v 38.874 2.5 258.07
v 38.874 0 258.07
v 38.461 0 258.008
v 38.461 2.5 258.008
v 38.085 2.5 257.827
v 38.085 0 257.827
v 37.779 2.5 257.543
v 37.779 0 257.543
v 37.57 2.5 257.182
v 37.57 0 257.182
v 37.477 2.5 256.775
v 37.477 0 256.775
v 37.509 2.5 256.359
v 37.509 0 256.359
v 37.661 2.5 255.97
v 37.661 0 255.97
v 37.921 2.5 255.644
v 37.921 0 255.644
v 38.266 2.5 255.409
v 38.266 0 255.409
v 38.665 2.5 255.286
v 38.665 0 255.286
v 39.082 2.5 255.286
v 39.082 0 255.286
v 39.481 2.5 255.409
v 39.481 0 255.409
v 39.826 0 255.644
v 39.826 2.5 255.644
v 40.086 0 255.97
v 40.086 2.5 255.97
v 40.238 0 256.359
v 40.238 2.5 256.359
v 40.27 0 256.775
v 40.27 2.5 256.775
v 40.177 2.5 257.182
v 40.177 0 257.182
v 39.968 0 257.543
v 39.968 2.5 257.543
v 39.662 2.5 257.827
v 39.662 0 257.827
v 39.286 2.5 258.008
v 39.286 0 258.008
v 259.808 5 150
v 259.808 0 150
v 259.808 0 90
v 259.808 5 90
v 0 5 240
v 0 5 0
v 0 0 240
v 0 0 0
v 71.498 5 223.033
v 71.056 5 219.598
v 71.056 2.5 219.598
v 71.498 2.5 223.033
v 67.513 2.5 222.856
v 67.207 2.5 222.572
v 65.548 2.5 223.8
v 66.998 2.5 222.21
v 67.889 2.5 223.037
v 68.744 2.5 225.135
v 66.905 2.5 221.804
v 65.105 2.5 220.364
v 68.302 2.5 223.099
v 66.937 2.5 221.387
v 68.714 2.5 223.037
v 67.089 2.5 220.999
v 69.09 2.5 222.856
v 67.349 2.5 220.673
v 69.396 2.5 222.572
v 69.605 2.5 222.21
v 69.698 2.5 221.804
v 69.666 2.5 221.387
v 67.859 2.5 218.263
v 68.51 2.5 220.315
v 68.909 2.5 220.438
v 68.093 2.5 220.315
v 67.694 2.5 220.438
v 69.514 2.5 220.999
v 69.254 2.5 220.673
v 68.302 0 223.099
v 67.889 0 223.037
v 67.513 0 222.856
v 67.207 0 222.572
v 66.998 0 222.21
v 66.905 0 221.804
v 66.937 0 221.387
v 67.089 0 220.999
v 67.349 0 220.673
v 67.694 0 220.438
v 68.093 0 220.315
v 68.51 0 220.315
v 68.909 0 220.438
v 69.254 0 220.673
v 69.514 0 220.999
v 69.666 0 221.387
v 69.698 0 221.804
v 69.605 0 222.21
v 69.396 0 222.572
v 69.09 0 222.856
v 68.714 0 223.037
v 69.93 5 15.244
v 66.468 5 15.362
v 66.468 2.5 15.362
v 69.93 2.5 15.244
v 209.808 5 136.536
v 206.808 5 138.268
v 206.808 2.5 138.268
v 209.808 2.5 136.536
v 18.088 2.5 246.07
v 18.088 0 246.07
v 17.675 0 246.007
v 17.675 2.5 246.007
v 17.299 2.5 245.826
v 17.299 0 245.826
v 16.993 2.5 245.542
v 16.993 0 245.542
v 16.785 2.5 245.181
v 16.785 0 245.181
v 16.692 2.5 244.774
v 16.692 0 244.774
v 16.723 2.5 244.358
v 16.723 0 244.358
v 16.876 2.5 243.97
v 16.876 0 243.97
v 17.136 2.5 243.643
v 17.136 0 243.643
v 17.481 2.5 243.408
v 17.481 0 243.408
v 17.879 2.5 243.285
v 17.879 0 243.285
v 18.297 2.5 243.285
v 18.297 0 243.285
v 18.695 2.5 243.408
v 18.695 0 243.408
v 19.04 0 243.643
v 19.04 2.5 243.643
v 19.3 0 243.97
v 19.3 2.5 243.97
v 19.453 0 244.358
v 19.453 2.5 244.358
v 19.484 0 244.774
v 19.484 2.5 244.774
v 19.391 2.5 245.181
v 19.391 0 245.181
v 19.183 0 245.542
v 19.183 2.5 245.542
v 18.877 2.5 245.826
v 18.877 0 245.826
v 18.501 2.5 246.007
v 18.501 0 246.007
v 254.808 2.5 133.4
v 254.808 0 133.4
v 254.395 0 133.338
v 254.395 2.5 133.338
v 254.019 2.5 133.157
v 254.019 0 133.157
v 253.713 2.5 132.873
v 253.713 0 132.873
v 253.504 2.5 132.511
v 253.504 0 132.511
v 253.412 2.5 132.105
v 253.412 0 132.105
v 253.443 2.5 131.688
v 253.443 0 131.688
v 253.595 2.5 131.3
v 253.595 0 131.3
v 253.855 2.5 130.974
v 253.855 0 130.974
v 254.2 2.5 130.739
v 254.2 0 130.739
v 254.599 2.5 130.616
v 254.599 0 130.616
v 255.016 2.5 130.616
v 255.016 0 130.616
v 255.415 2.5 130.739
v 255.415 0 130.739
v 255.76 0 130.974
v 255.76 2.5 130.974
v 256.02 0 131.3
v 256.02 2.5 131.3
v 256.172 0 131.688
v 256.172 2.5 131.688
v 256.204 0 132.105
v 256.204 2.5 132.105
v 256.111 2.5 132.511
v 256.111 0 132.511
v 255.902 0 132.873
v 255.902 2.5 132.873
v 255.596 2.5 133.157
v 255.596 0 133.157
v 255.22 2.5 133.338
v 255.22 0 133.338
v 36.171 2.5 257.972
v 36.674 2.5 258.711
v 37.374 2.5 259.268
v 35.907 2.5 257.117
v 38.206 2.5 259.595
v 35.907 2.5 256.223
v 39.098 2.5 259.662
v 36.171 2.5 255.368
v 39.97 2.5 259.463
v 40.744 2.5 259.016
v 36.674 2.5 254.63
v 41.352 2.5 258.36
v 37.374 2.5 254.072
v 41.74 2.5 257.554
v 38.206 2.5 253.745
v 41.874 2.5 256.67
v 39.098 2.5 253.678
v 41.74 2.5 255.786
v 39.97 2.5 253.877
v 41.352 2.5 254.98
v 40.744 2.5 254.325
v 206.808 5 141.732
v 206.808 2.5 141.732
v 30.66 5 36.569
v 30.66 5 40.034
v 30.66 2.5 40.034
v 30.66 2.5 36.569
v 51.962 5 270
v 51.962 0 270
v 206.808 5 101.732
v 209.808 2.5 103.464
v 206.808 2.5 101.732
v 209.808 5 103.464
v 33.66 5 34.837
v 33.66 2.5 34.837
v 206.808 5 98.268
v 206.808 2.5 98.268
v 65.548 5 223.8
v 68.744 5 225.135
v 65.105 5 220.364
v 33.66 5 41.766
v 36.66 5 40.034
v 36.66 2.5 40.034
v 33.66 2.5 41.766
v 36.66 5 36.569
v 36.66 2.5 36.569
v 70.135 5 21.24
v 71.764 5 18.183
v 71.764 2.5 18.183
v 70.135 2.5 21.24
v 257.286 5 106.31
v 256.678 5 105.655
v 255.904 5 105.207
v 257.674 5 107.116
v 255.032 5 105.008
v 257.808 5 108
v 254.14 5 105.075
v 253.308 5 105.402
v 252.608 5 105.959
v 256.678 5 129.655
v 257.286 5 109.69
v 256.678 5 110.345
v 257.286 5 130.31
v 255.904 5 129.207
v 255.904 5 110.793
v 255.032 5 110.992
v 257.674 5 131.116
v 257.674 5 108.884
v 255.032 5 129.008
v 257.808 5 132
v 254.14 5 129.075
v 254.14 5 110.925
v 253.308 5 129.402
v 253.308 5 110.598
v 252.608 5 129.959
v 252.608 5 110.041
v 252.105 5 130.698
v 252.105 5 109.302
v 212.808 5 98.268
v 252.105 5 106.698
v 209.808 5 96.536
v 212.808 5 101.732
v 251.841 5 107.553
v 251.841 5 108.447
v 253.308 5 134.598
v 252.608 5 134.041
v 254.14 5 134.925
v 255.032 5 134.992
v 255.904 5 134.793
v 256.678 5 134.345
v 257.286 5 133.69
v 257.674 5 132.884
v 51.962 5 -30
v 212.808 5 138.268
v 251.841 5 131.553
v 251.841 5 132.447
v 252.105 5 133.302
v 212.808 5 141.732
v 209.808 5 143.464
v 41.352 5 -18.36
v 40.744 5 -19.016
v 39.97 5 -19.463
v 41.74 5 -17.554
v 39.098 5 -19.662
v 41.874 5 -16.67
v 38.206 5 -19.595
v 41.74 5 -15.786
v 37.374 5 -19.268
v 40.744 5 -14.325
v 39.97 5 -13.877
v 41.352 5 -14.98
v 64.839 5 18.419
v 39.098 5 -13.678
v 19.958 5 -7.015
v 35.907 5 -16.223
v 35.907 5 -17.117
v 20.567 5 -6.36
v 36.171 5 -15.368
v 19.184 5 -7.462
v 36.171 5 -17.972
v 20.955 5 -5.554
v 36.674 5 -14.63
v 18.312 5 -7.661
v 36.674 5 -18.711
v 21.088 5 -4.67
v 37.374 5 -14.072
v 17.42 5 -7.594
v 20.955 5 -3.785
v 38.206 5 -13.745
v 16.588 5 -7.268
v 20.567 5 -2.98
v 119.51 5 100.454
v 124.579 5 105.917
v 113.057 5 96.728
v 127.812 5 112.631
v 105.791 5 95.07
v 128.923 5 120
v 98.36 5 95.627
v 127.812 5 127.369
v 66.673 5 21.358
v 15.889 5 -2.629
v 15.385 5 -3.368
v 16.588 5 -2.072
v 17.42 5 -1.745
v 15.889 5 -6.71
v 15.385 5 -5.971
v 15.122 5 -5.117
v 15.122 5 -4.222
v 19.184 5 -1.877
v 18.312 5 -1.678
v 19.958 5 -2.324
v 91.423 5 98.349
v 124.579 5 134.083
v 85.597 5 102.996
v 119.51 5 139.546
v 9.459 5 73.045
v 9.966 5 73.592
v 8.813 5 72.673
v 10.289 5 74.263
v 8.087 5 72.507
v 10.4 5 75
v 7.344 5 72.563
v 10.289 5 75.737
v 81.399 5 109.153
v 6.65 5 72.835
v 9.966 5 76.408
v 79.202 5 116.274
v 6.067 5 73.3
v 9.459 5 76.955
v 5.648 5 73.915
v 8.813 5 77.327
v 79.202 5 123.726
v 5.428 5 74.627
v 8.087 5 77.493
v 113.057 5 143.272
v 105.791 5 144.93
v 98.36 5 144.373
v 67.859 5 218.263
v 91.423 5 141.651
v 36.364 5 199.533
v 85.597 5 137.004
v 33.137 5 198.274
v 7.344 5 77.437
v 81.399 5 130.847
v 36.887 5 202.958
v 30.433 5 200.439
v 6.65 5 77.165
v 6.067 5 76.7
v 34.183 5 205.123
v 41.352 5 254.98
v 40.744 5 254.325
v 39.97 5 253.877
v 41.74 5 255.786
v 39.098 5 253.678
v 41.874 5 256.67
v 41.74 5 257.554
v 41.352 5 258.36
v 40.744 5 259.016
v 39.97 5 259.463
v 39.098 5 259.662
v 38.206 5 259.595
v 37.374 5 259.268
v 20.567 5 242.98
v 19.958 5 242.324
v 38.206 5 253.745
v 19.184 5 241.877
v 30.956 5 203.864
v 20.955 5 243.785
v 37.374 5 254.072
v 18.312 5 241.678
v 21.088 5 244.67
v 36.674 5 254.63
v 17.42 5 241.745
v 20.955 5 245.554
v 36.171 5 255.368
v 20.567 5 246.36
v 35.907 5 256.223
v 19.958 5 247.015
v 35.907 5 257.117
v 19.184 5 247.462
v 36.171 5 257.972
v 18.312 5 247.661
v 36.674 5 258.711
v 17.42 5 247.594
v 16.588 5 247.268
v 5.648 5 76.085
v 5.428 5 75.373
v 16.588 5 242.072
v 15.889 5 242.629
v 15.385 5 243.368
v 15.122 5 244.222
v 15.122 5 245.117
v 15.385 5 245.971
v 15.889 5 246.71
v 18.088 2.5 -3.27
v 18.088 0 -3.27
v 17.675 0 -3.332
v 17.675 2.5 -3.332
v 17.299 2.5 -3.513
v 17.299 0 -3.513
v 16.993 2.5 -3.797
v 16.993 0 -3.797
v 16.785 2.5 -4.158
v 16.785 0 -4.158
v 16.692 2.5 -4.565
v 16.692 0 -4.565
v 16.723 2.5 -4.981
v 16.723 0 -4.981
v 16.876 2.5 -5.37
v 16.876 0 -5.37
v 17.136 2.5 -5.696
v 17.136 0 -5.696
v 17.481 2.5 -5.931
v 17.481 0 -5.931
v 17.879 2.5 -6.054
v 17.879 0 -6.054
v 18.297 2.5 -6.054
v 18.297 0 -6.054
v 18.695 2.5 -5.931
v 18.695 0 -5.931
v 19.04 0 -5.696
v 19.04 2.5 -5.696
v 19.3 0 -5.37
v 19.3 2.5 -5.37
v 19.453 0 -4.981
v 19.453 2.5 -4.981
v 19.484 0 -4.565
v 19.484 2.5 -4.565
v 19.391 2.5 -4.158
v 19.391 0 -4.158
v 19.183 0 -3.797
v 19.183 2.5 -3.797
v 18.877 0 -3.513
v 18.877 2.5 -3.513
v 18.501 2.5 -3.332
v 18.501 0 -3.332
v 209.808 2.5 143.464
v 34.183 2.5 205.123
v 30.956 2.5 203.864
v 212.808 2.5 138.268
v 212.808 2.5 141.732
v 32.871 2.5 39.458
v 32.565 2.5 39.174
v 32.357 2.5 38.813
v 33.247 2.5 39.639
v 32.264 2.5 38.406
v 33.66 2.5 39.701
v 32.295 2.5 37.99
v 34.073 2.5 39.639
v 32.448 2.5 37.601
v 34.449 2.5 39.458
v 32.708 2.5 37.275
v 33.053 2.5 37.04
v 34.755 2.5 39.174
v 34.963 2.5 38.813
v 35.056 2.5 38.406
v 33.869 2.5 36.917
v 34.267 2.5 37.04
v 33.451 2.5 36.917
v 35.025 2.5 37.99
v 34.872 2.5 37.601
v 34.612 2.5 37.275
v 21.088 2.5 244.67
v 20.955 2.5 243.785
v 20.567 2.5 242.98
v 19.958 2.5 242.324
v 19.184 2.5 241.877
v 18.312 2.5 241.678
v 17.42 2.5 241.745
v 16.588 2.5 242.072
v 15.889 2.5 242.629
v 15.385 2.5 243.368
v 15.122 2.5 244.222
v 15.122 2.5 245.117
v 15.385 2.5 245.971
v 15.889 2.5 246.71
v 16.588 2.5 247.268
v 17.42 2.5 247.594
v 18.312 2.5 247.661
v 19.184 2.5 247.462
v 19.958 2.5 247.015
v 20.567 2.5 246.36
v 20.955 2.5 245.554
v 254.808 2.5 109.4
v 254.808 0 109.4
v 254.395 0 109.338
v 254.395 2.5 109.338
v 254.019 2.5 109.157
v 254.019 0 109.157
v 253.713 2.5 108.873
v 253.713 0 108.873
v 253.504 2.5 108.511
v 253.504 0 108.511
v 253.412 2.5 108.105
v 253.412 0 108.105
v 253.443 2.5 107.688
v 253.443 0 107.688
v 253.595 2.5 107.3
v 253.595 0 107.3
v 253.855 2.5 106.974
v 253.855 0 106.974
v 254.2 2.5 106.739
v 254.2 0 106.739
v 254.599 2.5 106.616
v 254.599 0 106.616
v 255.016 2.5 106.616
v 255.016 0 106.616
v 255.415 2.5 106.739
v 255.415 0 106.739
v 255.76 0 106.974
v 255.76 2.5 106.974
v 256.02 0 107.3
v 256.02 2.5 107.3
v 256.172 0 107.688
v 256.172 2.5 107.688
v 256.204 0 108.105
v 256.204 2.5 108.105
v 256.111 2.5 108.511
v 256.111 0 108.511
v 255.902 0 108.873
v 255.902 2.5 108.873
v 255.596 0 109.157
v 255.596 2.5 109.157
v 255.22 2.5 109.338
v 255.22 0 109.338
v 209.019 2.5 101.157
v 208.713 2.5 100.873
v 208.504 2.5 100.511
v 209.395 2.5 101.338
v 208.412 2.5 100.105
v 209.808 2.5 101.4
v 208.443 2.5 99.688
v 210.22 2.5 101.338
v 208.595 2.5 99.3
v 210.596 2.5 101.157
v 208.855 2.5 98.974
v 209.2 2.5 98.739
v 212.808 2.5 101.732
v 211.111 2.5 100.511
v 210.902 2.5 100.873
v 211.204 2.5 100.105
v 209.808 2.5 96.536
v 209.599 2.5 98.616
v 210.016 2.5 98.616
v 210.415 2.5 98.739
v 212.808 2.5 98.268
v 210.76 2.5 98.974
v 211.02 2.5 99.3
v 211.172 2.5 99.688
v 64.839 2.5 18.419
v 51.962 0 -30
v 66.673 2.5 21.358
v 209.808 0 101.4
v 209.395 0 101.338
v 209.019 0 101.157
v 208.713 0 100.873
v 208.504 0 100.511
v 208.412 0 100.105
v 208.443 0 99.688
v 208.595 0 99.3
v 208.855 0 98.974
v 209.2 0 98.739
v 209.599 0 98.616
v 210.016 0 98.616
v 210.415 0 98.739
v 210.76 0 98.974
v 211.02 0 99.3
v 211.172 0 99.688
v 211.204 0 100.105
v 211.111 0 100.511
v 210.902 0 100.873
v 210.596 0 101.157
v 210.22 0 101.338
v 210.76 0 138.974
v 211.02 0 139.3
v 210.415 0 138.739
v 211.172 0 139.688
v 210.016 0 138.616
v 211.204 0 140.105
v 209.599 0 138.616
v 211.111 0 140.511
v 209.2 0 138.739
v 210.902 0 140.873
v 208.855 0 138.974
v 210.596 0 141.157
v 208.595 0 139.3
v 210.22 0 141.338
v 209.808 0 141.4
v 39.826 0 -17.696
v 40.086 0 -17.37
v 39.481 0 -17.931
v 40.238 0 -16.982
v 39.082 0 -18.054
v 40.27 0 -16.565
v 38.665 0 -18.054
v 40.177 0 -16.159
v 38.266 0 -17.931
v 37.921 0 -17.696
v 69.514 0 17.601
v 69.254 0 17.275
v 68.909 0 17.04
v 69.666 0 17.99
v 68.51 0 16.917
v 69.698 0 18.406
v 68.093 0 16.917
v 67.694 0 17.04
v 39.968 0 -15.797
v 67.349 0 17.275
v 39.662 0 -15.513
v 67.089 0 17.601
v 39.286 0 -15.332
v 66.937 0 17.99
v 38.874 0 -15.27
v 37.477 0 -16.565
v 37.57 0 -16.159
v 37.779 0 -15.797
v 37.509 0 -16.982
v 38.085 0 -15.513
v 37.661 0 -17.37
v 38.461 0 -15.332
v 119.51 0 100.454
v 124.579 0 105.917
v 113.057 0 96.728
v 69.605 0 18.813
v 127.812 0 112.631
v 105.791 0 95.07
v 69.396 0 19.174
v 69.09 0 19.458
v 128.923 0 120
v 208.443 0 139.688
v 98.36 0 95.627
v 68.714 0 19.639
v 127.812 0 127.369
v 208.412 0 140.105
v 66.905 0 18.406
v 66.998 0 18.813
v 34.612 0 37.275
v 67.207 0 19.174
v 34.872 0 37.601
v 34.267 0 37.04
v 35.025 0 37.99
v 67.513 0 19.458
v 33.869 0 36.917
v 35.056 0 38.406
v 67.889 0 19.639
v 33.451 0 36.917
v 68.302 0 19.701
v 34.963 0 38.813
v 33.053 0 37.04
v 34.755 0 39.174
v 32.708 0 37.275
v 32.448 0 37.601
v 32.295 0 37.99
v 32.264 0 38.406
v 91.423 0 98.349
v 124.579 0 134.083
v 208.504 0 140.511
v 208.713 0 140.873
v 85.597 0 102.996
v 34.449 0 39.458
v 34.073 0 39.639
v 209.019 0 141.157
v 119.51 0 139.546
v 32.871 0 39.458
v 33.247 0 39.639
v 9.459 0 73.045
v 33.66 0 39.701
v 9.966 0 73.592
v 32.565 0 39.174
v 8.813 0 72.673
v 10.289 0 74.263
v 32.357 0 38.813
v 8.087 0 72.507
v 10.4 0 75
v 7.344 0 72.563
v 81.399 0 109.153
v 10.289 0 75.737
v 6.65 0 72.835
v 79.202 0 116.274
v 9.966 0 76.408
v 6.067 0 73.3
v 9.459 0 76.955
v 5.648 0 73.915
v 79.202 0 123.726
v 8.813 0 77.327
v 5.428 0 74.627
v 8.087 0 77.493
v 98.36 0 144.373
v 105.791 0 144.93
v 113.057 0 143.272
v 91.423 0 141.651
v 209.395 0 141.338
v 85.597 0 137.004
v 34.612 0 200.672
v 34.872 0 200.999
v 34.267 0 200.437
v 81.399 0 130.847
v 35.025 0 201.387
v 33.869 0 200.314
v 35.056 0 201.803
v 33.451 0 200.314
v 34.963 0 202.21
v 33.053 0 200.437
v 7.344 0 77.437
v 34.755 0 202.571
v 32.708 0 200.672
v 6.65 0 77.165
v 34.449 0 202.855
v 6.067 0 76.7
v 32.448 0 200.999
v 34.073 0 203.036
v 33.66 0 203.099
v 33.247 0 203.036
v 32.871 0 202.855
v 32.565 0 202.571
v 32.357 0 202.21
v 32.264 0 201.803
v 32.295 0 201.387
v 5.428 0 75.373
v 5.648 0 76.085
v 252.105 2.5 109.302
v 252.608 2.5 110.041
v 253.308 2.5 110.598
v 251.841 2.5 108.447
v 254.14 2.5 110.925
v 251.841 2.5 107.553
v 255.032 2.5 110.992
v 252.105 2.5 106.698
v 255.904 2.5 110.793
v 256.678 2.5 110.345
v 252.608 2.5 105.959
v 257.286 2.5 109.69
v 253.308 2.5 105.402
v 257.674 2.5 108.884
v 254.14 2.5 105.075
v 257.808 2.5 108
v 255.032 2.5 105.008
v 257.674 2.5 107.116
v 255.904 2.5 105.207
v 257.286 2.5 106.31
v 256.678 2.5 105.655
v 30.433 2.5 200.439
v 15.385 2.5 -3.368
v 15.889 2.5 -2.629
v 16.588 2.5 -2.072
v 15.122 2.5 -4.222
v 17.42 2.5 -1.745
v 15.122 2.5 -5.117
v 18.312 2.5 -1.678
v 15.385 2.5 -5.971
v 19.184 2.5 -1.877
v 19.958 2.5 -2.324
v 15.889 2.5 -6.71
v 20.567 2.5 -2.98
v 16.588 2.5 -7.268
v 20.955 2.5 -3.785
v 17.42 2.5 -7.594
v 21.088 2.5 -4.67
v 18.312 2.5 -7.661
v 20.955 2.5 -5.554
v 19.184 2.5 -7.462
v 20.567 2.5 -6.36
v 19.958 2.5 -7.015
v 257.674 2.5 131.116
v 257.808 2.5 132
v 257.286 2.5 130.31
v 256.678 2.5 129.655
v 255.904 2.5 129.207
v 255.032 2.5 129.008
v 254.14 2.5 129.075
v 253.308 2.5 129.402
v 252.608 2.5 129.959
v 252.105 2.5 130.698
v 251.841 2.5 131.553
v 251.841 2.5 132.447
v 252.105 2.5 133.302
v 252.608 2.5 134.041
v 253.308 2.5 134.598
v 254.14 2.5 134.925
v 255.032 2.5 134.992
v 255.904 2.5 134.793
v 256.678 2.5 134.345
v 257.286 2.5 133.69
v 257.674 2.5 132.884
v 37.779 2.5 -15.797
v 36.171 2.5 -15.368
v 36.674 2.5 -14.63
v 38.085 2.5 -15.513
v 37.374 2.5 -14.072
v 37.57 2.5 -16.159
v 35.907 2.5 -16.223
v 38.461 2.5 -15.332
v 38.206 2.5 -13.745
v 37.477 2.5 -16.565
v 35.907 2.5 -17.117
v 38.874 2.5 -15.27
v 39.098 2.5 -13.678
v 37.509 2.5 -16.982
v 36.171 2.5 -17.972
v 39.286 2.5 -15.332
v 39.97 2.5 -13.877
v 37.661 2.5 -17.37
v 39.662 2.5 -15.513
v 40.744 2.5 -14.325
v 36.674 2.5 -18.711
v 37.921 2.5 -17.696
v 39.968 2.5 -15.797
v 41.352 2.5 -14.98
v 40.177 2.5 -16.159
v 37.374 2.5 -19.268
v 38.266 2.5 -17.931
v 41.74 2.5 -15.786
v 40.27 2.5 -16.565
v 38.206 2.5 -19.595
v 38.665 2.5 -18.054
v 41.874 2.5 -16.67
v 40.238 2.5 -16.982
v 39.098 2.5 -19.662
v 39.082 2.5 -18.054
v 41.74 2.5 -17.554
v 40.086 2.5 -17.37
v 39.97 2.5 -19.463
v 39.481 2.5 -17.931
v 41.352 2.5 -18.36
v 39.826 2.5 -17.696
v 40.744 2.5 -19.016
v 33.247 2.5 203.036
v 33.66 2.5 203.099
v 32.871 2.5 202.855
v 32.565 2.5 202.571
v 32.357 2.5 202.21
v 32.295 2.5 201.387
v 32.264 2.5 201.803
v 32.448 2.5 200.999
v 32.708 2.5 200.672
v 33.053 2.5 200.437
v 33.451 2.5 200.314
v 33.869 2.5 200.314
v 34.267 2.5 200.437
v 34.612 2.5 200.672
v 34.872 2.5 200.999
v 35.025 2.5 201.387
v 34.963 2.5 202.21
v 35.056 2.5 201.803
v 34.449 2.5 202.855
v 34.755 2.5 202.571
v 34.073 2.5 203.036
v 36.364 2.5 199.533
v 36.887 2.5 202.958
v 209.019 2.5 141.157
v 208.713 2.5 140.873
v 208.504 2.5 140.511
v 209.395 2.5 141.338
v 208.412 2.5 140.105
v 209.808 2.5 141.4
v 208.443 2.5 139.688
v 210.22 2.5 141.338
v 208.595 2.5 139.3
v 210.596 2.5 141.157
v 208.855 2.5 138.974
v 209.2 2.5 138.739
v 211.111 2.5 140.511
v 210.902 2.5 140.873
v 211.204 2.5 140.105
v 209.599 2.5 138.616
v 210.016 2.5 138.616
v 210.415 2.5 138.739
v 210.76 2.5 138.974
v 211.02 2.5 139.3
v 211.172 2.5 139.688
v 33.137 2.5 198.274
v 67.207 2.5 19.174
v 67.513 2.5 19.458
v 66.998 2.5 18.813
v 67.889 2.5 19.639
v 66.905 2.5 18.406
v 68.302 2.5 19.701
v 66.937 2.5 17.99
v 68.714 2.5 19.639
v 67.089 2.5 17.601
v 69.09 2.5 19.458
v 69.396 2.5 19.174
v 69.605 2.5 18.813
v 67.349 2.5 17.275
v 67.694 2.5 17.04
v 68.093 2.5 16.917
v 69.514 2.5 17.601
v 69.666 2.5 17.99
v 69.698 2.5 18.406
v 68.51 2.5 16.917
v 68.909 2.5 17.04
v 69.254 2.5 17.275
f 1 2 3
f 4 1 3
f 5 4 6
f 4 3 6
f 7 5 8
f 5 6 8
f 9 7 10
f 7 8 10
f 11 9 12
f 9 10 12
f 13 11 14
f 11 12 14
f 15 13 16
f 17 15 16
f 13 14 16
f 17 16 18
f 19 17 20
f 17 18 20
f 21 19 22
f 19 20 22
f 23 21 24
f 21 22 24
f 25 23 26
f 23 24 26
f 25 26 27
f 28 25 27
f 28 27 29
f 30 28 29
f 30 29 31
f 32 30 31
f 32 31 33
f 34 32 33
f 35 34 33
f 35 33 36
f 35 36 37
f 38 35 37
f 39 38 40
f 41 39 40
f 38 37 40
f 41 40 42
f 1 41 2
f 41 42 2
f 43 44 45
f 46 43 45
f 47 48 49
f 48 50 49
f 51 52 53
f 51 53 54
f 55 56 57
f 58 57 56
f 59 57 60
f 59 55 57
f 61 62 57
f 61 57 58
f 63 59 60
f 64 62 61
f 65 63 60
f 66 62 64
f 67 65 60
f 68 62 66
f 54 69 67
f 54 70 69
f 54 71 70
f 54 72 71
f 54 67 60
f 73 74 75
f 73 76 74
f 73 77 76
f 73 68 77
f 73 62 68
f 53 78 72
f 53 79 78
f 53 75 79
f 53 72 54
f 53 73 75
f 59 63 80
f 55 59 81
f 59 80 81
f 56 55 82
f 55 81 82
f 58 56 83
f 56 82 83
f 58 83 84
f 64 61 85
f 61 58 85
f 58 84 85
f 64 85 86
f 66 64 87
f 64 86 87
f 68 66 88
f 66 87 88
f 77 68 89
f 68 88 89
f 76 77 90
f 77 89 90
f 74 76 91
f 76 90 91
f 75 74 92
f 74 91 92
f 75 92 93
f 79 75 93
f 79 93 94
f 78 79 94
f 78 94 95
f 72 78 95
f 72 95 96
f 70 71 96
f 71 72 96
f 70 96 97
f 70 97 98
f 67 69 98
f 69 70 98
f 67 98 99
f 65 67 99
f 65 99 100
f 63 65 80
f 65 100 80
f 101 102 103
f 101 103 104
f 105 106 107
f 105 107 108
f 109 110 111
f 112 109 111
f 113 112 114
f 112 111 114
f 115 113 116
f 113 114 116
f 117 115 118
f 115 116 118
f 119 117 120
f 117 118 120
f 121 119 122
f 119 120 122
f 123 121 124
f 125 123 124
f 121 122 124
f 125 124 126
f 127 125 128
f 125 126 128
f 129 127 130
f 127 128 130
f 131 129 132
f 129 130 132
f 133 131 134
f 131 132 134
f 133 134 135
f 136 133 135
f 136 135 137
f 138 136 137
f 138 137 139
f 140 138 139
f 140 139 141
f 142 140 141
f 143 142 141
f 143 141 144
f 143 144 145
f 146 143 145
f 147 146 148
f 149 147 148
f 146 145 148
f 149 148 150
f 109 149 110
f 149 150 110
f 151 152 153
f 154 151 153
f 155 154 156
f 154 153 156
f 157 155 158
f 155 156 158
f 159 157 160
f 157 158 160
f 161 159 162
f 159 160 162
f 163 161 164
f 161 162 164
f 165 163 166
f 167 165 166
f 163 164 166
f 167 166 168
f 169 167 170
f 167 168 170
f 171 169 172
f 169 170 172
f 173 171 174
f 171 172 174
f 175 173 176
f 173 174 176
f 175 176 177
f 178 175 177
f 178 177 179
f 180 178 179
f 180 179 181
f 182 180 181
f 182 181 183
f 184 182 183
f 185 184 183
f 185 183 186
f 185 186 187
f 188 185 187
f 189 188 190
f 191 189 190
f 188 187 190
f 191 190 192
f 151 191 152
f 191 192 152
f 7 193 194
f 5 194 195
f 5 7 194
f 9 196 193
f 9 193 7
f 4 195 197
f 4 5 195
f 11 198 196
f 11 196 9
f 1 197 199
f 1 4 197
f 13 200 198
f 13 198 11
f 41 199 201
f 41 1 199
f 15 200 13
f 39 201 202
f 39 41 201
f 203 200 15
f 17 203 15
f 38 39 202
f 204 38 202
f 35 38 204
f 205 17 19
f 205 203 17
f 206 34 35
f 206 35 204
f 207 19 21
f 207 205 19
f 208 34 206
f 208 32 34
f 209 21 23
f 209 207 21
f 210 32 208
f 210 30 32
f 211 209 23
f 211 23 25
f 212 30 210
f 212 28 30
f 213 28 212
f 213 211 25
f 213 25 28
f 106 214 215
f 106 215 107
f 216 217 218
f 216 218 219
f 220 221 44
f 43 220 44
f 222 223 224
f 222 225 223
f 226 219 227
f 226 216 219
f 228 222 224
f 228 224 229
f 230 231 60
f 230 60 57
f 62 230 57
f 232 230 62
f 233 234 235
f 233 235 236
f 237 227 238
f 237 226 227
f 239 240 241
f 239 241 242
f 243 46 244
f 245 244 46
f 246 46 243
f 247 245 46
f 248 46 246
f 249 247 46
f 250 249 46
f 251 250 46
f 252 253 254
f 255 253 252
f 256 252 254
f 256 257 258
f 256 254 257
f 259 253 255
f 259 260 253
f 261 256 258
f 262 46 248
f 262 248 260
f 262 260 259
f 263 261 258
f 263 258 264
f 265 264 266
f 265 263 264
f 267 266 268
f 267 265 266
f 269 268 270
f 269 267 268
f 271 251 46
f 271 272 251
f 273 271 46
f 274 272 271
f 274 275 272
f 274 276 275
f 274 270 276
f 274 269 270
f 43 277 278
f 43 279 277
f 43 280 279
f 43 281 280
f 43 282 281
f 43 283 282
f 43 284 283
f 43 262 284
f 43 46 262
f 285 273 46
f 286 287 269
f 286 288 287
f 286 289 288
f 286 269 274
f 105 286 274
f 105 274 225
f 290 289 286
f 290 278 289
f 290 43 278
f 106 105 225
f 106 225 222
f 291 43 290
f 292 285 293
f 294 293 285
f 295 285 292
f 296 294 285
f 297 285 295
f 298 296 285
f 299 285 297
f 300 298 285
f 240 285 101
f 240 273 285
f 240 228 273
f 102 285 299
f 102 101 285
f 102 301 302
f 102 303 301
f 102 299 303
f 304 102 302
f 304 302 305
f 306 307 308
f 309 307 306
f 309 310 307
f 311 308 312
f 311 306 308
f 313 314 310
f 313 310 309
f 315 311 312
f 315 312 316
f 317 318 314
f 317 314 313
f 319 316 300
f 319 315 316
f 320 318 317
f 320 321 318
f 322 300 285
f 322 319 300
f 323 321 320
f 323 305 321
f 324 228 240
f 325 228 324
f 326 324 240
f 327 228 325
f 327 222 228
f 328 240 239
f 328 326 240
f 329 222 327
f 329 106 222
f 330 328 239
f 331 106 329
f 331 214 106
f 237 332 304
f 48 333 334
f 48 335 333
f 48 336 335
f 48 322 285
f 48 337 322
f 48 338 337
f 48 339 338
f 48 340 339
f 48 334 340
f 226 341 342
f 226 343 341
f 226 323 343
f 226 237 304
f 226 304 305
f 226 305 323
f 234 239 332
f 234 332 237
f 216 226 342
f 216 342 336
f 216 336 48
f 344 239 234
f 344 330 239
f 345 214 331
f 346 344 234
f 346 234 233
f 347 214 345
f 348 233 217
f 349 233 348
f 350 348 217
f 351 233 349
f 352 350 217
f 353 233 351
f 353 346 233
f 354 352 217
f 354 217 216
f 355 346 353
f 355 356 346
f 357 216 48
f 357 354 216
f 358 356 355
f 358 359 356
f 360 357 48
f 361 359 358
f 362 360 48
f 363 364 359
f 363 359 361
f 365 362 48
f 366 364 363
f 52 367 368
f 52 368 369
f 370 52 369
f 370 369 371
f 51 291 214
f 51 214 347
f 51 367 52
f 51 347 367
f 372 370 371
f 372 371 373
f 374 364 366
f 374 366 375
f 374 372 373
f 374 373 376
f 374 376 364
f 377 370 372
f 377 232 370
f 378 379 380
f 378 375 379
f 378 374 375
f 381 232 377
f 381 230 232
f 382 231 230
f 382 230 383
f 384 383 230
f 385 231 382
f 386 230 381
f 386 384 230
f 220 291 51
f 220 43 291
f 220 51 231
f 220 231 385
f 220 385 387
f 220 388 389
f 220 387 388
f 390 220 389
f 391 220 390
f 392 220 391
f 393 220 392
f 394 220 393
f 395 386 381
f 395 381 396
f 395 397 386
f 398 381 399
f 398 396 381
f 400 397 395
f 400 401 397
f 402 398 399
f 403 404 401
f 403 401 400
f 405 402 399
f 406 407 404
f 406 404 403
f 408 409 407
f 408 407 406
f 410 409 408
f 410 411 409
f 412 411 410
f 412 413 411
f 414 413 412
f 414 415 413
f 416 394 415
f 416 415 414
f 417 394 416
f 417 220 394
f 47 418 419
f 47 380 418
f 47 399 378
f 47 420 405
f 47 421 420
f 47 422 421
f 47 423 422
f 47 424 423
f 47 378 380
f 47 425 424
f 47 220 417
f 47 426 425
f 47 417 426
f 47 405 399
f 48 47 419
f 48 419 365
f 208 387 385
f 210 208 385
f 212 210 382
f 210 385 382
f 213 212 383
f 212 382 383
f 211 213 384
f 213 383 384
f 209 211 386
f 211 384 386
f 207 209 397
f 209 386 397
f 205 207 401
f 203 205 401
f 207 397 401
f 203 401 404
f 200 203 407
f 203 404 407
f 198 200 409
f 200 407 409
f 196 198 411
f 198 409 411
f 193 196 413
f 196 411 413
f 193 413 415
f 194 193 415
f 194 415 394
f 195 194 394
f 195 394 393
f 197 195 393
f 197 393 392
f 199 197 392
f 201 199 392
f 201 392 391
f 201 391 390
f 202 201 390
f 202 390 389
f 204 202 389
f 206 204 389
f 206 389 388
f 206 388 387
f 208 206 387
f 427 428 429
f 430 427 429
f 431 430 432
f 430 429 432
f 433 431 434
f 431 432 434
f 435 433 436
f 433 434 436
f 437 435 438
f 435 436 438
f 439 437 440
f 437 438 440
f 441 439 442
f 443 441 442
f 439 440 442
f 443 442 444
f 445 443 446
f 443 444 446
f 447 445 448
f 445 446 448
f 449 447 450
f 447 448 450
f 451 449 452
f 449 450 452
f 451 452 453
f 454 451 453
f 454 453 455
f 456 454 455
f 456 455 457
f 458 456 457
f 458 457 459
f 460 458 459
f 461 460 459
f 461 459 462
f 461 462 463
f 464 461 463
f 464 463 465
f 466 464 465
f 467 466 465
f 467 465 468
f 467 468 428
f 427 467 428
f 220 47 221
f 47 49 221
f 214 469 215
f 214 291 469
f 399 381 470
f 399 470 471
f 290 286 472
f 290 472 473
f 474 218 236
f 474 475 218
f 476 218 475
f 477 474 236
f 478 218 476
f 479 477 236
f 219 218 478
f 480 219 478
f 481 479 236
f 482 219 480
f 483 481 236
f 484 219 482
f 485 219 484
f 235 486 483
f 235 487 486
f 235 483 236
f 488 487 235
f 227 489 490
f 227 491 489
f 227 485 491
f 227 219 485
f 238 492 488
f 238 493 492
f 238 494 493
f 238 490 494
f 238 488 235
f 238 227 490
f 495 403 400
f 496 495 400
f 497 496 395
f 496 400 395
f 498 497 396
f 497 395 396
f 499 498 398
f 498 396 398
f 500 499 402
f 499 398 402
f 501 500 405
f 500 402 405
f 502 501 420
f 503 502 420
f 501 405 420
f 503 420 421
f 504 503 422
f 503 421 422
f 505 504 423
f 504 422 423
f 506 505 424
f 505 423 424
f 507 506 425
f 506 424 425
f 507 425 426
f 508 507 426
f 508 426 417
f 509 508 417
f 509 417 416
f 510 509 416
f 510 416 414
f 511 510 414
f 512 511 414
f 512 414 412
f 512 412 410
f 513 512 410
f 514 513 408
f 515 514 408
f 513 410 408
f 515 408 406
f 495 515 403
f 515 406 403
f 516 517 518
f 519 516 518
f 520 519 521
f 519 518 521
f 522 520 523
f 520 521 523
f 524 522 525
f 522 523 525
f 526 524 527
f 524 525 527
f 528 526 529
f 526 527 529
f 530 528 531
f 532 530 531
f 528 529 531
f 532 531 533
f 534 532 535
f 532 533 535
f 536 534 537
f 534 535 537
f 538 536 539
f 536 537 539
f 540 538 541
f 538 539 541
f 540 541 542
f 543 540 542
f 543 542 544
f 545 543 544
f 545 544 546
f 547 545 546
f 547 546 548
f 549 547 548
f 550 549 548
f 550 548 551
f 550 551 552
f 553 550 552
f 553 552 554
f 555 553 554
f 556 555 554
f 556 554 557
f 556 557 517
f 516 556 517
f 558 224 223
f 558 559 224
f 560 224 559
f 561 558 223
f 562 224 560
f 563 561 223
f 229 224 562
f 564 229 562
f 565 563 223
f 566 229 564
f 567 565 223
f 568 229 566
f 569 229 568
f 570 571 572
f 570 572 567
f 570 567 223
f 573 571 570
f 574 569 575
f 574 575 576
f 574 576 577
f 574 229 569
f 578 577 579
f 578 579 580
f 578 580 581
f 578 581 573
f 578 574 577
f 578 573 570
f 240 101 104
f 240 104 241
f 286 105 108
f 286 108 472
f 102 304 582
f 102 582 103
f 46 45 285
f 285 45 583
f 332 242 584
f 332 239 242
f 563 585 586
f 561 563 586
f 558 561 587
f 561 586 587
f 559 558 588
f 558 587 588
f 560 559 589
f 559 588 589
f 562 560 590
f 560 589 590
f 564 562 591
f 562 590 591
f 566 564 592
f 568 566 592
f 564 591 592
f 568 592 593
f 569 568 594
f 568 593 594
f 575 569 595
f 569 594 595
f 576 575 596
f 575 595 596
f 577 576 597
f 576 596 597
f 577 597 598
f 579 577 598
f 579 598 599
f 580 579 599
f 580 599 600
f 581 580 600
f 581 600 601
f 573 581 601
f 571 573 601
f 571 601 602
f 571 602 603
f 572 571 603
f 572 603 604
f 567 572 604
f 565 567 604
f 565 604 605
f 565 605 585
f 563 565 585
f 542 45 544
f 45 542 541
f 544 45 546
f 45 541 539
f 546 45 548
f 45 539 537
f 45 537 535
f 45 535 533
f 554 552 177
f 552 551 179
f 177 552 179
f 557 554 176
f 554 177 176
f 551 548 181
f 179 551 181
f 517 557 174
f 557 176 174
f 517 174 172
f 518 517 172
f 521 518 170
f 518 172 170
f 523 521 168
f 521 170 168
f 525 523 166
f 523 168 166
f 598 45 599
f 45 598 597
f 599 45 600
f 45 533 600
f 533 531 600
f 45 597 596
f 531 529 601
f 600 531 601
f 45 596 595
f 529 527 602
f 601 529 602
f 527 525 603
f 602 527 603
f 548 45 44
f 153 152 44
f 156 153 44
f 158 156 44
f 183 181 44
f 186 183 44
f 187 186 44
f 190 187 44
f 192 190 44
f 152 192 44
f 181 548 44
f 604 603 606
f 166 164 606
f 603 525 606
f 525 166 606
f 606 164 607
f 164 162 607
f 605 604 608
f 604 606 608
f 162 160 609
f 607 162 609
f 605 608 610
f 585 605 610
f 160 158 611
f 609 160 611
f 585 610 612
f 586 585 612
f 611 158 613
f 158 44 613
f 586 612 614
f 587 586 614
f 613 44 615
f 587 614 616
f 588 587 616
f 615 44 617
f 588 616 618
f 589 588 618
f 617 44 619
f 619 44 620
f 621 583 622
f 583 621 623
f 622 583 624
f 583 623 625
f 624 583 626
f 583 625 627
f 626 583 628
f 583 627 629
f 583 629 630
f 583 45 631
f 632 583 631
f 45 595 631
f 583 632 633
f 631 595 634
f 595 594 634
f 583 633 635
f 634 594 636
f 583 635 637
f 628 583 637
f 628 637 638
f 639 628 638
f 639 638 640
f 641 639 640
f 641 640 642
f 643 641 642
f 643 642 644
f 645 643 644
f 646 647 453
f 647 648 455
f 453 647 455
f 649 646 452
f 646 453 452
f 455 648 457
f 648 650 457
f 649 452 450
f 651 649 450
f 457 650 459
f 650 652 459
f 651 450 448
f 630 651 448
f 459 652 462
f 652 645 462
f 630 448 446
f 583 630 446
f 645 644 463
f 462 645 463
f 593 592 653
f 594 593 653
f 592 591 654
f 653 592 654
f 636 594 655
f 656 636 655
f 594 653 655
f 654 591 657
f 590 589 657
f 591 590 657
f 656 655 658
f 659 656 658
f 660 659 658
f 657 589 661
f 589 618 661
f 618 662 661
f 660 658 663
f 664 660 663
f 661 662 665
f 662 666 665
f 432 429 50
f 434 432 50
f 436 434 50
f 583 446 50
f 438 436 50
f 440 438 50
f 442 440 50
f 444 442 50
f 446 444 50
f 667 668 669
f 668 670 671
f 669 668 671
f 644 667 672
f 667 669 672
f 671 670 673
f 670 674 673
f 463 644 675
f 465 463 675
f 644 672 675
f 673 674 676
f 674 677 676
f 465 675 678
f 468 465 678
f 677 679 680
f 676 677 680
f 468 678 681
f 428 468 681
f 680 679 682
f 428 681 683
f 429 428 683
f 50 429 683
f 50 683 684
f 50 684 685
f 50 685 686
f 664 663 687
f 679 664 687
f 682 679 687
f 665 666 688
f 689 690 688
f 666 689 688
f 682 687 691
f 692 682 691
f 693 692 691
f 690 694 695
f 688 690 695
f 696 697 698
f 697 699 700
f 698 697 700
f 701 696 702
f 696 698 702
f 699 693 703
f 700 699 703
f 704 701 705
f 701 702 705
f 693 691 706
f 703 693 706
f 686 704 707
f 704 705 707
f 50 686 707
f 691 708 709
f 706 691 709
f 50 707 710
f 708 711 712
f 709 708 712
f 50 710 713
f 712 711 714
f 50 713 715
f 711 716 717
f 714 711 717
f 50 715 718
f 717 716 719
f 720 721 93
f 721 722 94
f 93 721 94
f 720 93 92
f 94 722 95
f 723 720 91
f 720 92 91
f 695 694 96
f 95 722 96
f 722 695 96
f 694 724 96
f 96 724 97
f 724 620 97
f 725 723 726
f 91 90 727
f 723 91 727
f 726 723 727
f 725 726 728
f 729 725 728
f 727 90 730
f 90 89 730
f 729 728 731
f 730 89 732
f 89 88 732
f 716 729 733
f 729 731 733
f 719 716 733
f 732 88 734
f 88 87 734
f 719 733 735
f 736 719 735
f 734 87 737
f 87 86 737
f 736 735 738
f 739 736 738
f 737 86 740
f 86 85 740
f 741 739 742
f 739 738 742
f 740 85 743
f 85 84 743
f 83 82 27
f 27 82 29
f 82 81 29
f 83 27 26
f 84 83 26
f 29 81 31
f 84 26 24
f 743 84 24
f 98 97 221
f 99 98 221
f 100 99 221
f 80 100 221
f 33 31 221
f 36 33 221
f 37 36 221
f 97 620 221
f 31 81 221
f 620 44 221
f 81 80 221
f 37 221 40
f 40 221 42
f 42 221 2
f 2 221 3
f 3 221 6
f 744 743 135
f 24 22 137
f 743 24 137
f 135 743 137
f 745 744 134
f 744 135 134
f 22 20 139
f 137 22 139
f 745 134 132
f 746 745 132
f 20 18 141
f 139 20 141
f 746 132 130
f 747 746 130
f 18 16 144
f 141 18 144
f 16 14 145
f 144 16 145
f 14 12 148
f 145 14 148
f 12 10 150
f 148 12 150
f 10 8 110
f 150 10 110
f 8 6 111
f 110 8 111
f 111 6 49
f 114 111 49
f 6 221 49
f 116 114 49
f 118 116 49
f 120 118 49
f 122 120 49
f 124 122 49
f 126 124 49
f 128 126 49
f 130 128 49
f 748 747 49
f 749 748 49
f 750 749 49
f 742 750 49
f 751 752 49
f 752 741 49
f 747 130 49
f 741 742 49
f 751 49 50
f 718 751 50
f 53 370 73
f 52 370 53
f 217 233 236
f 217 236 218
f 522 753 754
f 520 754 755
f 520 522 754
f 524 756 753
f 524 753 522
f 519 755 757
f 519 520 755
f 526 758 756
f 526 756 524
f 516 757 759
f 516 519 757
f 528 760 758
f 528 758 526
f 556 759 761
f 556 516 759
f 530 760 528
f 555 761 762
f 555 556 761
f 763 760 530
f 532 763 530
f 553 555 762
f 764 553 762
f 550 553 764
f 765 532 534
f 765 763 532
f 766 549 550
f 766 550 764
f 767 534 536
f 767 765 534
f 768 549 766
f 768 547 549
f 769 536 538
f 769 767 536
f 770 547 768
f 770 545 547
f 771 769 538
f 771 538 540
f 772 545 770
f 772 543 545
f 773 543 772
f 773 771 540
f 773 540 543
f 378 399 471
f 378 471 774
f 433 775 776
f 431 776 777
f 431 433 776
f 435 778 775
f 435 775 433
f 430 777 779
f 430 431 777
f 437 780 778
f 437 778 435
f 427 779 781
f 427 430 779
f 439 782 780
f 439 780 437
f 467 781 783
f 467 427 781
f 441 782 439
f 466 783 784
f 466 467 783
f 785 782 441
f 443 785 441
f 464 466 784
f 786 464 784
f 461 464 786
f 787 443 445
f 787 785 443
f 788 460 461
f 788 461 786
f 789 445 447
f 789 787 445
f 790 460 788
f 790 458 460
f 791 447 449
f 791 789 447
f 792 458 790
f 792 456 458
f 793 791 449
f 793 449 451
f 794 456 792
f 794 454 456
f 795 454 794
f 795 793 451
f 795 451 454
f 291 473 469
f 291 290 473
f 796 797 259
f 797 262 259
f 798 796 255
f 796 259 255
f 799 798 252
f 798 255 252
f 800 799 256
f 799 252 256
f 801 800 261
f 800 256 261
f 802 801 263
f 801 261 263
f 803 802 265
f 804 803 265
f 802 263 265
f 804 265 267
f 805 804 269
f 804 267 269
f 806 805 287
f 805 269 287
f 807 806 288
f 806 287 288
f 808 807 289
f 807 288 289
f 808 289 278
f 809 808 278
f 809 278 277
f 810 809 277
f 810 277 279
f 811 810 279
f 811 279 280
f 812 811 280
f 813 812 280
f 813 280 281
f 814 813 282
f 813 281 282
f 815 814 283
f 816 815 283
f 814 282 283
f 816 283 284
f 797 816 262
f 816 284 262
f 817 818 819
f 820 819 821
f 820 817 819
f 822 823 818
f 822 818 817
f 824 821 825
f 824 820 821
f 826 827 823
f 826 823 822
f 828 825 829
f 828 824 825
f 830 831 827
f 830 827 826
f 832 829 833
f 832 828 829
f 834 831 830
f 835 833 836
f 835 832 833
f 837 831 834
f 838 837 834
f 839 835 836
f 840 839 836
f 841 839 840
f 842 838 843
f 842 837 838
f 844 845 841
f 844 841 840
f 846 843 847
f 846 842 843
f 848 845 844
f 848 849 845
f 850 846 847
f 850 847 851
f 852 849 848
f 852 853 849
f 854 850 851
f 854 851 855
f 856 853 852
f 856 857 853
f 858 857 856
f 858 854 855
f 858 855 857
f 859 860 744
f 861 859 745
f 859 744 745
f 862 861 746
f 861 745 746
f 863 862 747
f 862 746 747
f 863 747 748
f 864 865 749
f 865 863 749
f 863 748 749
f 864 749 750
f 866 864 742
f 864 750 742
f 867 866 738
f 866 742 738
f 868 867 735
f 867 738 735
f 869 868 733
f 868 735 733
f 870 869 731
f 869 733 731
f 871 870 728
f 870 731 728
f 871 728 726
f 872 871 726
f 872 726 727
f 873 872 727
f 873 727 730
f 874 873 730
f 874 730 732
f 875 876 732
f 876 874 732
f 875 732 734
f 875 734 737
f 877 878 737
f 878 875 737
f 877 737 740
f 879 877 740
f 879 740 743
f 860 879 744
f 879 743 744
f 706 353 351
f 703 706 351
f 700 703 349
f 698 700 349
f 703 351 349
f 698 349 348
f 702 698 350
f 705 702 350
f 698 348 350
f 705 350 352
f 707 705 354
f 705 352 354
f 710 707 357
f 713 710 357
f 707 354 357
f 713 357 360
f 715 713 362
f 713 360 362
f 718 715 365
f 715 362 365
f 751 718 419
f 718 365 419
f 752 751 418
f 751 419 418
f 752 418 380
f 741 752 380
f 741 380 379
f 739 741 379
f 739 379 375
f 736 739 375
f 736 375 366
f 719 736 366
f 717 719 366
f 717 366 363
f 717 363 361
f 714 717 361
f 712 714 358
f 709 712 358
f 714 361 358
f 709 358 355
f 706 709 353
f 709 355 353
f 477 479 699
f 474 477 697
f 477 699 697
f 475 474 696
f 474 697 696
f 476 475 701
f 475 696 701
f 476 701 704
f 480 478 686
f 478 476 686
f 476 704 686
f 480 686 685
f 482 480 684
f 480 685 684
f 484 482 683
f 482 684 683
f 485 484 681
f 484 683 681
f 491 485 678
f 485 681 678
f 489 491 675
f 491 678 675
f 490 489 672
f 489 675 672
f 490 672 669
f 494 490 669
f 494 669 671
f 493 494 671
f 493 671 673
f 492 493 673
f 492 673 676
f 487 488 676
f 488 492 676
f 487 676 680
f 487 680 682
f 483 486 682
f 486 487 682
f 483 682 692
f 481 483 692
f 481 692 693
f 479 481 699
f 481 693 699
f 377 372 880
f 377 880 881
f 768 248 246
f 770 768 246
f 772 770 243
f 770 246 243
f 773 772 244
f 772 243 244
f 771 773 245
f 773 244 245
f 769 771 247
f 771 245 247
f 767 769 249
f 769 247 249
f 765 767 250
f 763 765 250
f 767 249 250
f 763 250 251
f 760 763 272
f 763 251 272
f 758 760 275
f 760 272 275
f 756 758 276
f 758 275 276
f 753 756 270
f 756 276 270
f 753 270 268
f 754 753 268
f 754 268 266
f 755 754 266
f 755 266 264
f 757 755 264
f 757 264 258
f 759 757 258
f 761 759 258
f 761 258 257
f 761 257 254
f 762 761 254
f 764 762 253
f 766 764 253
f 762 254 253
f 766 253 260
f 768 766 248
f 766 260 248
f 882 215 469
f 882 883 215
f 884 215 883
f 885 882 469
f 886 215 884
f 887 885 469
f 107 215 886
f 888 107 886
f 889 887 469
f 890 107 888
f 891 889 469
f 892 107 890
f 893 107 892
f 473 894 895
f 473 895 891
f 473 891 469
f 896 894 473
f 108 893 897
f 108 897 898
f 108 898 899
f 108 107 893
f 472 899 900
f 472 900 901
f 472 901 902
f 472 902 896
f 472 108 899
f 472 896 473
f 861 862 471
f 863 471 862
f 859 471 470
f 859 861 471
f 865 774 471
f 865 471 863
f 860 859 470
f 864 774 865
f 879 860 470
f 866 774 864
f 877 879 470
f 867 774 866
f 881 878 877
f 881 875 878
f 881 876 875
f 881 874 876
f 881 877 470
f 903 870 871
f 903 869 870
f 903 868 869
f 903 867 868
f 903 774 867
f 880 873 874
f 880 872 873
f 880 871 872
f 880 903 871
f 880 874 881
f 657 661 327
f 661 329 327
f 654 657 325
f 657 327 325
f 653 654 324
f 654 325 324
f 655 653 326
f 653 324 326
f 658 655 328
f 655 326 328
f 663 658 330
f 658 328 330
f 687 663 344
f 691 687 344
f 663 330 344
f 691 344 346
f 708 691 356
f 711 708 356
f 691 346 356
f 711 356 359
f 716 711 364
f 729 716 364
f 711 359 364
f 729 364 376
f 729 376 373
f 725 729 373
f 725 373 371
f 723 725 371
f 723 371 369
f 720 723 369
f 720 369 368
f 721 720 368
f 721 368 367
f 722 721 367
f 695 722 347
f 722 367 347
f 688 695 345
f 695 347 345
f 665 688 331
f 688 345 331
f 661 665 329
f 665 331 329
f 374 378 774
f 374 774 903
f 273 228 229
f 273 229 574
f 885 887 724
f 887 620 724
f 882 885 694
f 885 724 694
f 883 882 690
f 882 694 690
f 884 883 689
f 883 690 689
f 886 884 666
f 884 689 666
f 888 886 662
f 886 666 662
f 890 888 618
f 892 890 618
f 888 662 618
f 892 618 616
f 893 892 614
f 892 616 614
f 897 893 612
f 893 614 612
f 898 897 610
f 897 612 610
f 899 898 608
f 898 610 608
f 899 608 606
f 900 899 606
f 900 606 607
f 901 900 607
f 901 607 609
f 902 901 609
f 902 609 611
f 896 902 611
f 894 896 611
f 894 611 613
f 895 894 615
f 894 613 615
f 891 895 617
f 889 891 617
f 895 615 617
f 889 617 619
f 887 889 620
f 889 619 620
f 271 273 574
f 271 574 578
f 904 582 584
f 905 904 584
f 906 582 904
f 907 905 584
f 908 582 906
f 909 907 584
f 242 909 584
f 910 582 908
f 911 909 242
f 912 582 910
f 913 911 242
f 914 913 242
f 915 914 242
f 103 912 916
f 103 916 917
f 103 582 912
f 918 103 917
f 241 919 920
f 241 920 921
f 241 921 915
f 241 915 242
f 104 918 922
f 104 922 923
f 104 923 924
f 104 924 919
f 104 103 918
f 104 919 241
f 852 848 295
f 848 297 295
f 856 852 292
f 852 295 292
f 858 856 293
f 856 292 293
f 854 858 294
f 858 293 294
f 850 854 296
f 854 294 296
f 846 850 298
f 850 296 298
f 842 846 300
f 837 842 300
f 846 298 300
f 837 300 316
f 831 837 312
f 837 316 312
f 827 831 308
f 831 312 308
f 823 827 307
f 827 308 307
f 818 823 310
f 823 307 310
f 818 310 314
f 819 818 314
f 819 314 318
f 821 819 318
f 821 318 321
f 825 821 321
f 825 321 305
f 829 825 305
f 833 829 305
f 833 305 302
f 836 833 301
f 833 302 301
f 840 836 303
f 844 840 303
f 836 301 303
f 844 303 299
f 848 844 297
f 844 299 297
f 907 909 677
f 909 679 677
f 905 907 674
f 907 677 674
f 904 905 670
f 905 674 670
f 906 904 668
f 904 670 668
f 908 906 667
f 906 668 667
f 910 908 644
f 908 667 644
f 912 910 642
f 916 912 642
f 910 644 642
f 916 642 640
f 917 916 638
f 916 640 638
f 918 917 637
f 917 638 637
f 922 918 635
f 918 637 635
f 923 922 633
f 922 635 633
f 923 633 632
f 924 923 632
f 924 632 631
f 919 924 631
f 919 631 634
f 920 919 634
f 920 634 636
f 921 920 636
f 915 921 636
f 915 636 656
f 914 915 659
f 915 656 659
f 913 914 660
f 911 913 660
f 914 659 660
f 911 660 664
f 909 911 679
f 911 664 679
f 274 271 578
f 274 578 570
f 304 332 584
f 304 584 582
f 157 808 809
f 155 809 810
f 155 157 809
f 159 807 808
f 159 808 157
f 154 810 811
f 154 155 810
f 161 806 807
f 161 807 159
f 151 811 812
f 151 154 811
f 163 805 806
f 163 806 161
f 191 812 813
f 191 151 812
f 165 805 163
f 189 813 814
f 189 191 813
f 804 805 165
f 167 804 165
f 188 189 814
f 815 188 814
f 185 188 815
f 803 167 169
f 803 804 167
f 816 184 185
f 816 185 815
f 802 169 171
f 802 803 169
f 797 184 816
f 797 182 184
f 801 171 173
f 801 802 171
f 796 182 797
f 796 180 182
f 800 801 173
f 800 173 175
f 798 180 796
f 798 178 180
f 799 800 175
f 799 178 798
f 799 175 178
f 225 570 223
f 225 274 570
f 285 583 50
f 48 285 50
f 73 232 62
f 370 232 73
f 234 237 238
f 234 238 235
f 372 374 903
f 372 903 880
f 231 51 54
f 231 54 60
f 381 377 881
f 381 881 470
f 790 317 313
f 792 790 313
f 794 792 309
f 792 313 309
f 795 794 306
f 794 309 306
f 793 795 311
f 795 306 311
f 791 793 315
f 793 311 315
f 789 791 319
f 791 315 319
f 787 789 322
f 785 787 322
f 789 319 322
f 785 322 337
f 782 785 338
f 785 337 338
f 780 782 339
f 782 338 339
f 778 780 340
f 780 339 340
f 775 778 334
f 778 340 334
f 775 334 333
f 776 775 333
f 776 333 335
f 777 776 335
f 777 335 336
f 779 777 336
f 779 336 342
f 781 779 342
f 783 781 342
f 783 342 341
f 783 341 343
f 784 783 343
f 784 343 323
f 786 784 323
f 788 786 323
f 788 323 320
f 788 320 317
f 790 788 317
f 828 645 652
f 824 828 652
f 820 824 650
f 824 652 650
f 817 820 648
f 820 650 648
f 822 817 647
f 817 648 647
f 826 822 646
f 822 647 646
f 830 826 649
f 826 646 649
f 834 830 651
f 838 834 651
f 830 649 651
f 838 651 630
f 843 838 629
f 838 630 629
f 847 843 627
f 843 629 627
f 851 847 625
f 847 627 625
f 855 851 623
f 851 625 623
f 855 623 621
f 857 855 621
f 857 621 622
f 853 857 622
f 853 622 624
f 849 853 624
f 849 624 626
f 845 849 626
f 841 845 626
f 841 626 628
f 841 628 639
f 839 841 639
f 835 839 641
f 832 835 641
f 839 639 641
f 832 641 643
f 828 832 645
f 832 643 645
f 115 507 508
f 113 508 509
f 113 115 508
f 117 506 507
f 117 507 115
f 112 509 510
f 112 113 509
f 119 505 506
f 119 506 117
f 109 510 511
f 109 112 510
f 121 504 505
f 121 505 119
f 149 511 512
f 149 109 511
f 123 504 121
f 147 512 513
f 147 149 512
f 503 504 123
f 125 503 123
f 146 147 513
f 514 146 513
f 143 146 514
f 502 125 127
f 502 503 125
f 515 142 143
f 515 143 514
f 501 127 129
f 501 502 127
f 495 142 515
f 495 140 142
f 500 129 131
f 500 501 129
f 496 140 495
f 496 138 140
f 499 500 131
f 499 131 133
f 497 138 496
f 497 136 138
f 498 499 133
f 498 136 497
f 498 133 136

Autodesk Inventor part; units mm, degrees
ref_plane "YZ Plane" through (0, 0, 0) normal (1, 0, 0) x (0, 1, 0)
ref_plane "XZ Plane" through (0, 0, 0) normal (0, 1, 0) x (-1, 0, 0)
ref_plane "XY Plane" through (0, 0, 0) normal (0, 0, 1) x (1, 0, 0)
sketch "Sketch1" plane through (0, 0, 0) normal (0, 1, 0) x (-1, 0, 0)
  line L0 (-259.8076, 150) -> (-259.8076, 90)
  line L1 (-259.8076, 90) -> (-51.9615, -30)
  line L2 (-51.9615, -30) -> (0, 0)
  line L3 (0, 0) -> (0, 240)
  line L4 (0, 240) -> (-51.9615, 270)
  line L5 (-51.9615, 270) -> (-259.8076, 150)
  dimension "d0" = 120
  dimension "d1" = 120
  dimension "d2" = 120
  dimension "d4" = 120
  dimension "d5" = 120
  dimension "d6" = 60
  dimension "d7" = 120
extrude "Extrusion1" add sketch "Sketch1" along normal blind 5
sketch "Sketch2" plane through (0, 5, 0) normal (0, 1, 0) x (1, 0, 0)
  line L0 (254.8076, -108) -> (254.8076, -132)
  line L1 (259.8076, -150) -> (259.8076, -90) projected
  line L2 (259.8076, -90) -> (51.9615, 30) projected
  line L3 (51.9615, -270) -> (259.8076, -150) projected
  line L4 (209.8076, -108) -> (209.8076, -132)
  line L5 (209.8076, -108) -> (209.8076, -100)
  line L6 (209.8076, -144.7569) -> (209.8076, -140)
  point P0 (0, 0)
  dimension "d10" = 24
  dimension "d11" = 5
  dimension "d12" = 18
  dimension "d31" = 18.0885
  dimension "d32" = 18.0885
  dimension "d33" = 18
  dimension "d44" = 45
  dimension "d45" = 0
  dimension "d47" = 40.5885
  dimension "d51" = 8
  dimension "d52" = 8
hole "Hole1" at (209.8076, 5, 100) at (209.8076, 5, 140) at (254.8076, 5, 108) at (254.8076, 5, 132) direction (0, -1, 0) diameter 2.8 end through all
sketch "Sketch3" plane through (0, 5, 0) normal (0, 1, 0) x (1, 0, 0)
  line L0 (18.088, 4.6696) -> (38.8735, 16.6701)
  line L1 (51.9615, 30) -> (0, 0) projected
  line L2 (0, 0) -> (0, -240) projected
  line L3 (259.8076, -90) -> (51.9615, 30) projected
  line L4 (47.516, -30.3017) -> (68.3015, -18.3011)
  line L5 (68.3015, -18.3011) -> (68.3015, -18.3011)
  line L6 (47.516, -30.3017) -> (33.66, -38.3014)
  dimension "d20" = 5
  dimension "d22" = 18.088
  dimension "d23" = 18.088
  dimension "d46" = 45
  dimension "d48" = 33.66
  dimension "d53" = 33.66
  dimension "d89" = 33.66
hole "Hole2" at (68.3015, 5, 18.3011) at (33.66, 5, 38.3014) at (18.088, 5, -4.6696) at (38.8735, 5, -16.6701) direction (0, -1, 0) diameter 2.8 end through all
sketch "Sketch4" plane through (0, 5, 0) normal (0, 1, 0) x (1, 0, 0)
  line L0 (18.088, -244.6696) -> (38.8735, -256.6701)
  line L1 (0, -240) -> (51.9615, -270) projected
  line L2 (51.9615, -270) -> (259.8076, -150) projected
  line L3 (0, 0) -> (0, -240) projected
  line L4 (47.516, -209.6983) -> (68.3015, -221.6989)
  line L5 (68.3015, -221.6989) -> (68.3015, -221.6989)
  line L6 (47.516, -209.6983) -> (33.66, -201.6986)
  dimension "d34" = 5
  dimension "d35" = 18.088
  dimension "d36" = 18.088
  dimension "d49" = 45
  dimension "d50" = 33.66
  dimension "d56" = 33.66
  dimension "d90" = 33.66
hole "Hole3" at (68.3015, 5, 221.6989) at (33.66, 5, 201.6986) at (18.088, 5, 244.6696) at (38.8735, 5, 256.6701) direction (0, -1, 0) diameter 2.8 end through all
sketch "Sketch5" plane through (0, 5, 0) normal (0, 1, 0) x (1, 0, 0)
  circle A0 centre (103.923, -120) radius 25
  line L0 (0, 0) -> (0, -240) projected
  line L1 (259.8076, -90) -> (51.9615, 30) projected
  line L2 (51.9615, 30) -> (0, 0) projected
  line L3 (25.9808, 15) -> (155.8846, -210)
  line L4 (51.9615, -270) -> (259.8076, -150) projected
  line L5 (51.9615, 30) -> (0, 0) projected
  line L6 (0, 0) -> (0, -240) projected
  line L7 (0, -120) -> (259.8076, -120)
  line L8 (259.8076, -150) -> (259.8076, -90) projected
  line L9 (0, -240) -> (51.9615, -270) projected
  line L10 (25.9808, -255) -> (155.8846, -30)
  dimension "d57" = 50
  dimension "d60" = 0
  dimension "d61" = 0
extrude "Extrusion2" cut sketch "Sketch5" against normal through all contours L7 L10 A0 | A0 L3 L7 | L10 L3 A0 | A0 L10 L3 | L7 A0 L3 | L10 A0 L7
sketch "Sketch6" plane through (0, 5, 0) normal (0, 1, 0) x (1, 0, 0)
  circle A0 centre (103.923, -120) radius 25 projected
  circle A1 centre (18.088, -244.6696) radius 1.4 projected
  circle A2 centre (68.3015, -221.6989) radius 1.4 projected
  circle A3 centre (33.66, -201.6986) radius 1.4 projected
  circle A4 centre (38.8735, -256.6701) radius 1.4 projected
  circle A5 centre (18.088, 4.6696) radius 1.4 projected
  circle A6 centre (68.3015, -18.3011) radius 1.4 projected
  circle A7 centre (33.66, -38.3014) radius 1.4 projected
  circle A8 centre (38.8735, 16.6701) radius 1.4 projected
  circle A9 centre (254.8076, -108) radius 1.4 projected
  circle A10 centre (209.8076, -100) radius 1.4 projected
  circle A11 centre (209.8076, -140) radius 1.4 projected
  circle A12 centre (254.8076, -132) radius 1.4 projected
  line L0 (259.8076, -90) -> (51.9615, 30) projected
  line L1 (51.9615, 30) -> (0, 0) projected
  line L2 (0, 0) -> (0, -240) projected
  line L3 (0, -240) -> (51.9615, -270) projected
  line L4 (51.9615, -270) -> (259.8076, -150) projected
  line L5 (259.8076, -150) -> (259.8076, -90) projected
  line L6 (36.3641, -199.5334) -> (36.8871, -202.9578)
  line L7 (36.8871, -202.9578) -> (34.183, -205.123)
  line L8 (34.183, -205.123) -> (30.9559, -203.8638)
  line L9 (30.9559, -203.8638) -> (30.4329, -200.4394)
  line L10 (30.4329, -200.4394) -> (33.137, -198.2742)
  line L11 (33.137, -198.2742) -> (36.3641, -199.5334)
  circle A13 centre (68.3015, -221.6989) radius 1.4 projected
  line L12 (67.8588, -218.2632) -> (71.0556, -219.5976)
  line L13 (71.0556, -219.5976) -> (71.4983, -223.0333)
  line L14 (71.4983, -223.0333) -> (68.7442, -225.1346)
  line L15 (68.7442, -225.1346) -> (65.5475, -223.8001)
  line L16 (65.5475, -223.8001) -> (65.1048, -220.3644)
  line L17 (65.1048, -220.3644) -> (67.8588, -218.2632)
  circle A14 centre (209.8076, -140) radius 1.4 projected
  line L18 (212.8076, -138.2679) -> (212.8076, -141.7321)
  line L19 (212.8076, -141.7321) -> (209.8076, -143.4641)
  line L20 (209.8076, -143.4641) -> (206.8076, -141.7321)
  line L21 (206.8076, -141.7321) -> (206.8076, -138.2679)
  line L22 (206.8076, -138.2679) -> (209.8076, -136.5359)
  line L23 (209.8076, -136.5359) -> (212.8076, -138.2679)
  line L24 (206.8076, -98.2679) -> (209.8076, -96.5359)
  line L25 (209.8076, -96.5359) -> (212.8076, -98.2679)
  line L26 (212.8076, -98.2679) -> (212.8076, -101.7321)
  line L27 (212.8076, -101.7321) -> (209.8076, -103.4641)
  line L28 (209.8076, -103.4641) -> (206.8076, -101.7321)
  line L29 (206.8076, -101.7321) -> (206.8076, -98.2679)
  circle A15 centre (68.3015, -18.3011) radius 1.4 projected
  line L30 (69.9304, -15.2439) -> (71.7636, -18.1831)
  line L31 (71.7636, -18.1831) -> (70.1348, -21.2404)
  line L32 (70.1348, -21.2404) -> (66.6727, -21.3584)
  line L33 (66.6727, -21.3584) -> (64.8394, -18.4191)
  line L34 (64.8394, -18.4191) -> (66.4683, -15.3619)
  line L35 (66.4683, -15.3619) -> (69.9304, -15.2439)
  circle A16 centre (33.66, -38.3014) radius 1.4 projected
  line L36 (33.66, -34.8373) -> (36.66, -36.5694)
  line L37 (36.66, -36.5694) -> (36.66, -40.0335)
  line L38 (36.66, -40.0335) -> (33.66, -41.7655)
  line L39 (33.66, -41.7655) -> (30.66, -40.0335)
  line L40 (30.66, -40.0335) -> (30.66, -36.5694)
  line L41 (30.66, -36.5694) -> (33.66, -34.8373)
  line L42 (0, 0) -> (0, -240) projected
  line L43 (51.9615, -270) -> (259.8076, -150) projected
  line L44 (259.8076, -90) -> (51.9615, 30) projected
  circle A17 centre (18.088, -244.6696) radius 3
  circle A18 centre (38.8735, -256.6701) radius 3
  circle A19 centre (18.088, 4.6696) radius 3
  circle A20 centre (38.8735, 16.6701) radius 3
  circle A21 centre (254.8076, -108) radius 3
  circle A22 centre (254.8076, -132) radius 3
  dimension "d66" = 6
  dimension "d67" = 6
  dimension "d68" = 6
  dimension "d71" = 6
  dimension "d72" = 6
  dimension "d73" = 6
  dimension "d78" = 6
  dimension "d79" = 6
  dimension "d80" = 6
  dimension "d81" = 6
  dimension "d82" = 6
  dimension "d83" = 6
extrude "Extrusion3" cut sketch "Sketch6" against normal blind 2.5 contours A1 | A4 | A5 | A6 | A8 | A9 | A10 | A11 | A12 | L6 L7 L8 L9 L10 L11 | L12 L13 L14 L15 L16 L17 | L18 L19 L20 L21 L22 L23 | L24 L25 L26 L27 L28 L29 | L30 L31 L32 L33 L34 L35 | L36 L37 L38 L39 L40 L41 | A17 | A18 | A19 | A20 | A21 | A22
sketch "Sketch7" plane through (0, 5, 0) normal (0, 1, 0) x (1, 0, 0)
  circle A0 centre (7.9, -75) radius 2.5
  line L0 (0, 0) -> (0, -240) projected
  dimension "d84" = 75
  dimension "d85" = 5
  dimension "d88" = 7.9
extrude "Extrusion4" cut sketch "Sketch7" against normal through all
properties part number "lep_felso" material "Wood (Birch)"
